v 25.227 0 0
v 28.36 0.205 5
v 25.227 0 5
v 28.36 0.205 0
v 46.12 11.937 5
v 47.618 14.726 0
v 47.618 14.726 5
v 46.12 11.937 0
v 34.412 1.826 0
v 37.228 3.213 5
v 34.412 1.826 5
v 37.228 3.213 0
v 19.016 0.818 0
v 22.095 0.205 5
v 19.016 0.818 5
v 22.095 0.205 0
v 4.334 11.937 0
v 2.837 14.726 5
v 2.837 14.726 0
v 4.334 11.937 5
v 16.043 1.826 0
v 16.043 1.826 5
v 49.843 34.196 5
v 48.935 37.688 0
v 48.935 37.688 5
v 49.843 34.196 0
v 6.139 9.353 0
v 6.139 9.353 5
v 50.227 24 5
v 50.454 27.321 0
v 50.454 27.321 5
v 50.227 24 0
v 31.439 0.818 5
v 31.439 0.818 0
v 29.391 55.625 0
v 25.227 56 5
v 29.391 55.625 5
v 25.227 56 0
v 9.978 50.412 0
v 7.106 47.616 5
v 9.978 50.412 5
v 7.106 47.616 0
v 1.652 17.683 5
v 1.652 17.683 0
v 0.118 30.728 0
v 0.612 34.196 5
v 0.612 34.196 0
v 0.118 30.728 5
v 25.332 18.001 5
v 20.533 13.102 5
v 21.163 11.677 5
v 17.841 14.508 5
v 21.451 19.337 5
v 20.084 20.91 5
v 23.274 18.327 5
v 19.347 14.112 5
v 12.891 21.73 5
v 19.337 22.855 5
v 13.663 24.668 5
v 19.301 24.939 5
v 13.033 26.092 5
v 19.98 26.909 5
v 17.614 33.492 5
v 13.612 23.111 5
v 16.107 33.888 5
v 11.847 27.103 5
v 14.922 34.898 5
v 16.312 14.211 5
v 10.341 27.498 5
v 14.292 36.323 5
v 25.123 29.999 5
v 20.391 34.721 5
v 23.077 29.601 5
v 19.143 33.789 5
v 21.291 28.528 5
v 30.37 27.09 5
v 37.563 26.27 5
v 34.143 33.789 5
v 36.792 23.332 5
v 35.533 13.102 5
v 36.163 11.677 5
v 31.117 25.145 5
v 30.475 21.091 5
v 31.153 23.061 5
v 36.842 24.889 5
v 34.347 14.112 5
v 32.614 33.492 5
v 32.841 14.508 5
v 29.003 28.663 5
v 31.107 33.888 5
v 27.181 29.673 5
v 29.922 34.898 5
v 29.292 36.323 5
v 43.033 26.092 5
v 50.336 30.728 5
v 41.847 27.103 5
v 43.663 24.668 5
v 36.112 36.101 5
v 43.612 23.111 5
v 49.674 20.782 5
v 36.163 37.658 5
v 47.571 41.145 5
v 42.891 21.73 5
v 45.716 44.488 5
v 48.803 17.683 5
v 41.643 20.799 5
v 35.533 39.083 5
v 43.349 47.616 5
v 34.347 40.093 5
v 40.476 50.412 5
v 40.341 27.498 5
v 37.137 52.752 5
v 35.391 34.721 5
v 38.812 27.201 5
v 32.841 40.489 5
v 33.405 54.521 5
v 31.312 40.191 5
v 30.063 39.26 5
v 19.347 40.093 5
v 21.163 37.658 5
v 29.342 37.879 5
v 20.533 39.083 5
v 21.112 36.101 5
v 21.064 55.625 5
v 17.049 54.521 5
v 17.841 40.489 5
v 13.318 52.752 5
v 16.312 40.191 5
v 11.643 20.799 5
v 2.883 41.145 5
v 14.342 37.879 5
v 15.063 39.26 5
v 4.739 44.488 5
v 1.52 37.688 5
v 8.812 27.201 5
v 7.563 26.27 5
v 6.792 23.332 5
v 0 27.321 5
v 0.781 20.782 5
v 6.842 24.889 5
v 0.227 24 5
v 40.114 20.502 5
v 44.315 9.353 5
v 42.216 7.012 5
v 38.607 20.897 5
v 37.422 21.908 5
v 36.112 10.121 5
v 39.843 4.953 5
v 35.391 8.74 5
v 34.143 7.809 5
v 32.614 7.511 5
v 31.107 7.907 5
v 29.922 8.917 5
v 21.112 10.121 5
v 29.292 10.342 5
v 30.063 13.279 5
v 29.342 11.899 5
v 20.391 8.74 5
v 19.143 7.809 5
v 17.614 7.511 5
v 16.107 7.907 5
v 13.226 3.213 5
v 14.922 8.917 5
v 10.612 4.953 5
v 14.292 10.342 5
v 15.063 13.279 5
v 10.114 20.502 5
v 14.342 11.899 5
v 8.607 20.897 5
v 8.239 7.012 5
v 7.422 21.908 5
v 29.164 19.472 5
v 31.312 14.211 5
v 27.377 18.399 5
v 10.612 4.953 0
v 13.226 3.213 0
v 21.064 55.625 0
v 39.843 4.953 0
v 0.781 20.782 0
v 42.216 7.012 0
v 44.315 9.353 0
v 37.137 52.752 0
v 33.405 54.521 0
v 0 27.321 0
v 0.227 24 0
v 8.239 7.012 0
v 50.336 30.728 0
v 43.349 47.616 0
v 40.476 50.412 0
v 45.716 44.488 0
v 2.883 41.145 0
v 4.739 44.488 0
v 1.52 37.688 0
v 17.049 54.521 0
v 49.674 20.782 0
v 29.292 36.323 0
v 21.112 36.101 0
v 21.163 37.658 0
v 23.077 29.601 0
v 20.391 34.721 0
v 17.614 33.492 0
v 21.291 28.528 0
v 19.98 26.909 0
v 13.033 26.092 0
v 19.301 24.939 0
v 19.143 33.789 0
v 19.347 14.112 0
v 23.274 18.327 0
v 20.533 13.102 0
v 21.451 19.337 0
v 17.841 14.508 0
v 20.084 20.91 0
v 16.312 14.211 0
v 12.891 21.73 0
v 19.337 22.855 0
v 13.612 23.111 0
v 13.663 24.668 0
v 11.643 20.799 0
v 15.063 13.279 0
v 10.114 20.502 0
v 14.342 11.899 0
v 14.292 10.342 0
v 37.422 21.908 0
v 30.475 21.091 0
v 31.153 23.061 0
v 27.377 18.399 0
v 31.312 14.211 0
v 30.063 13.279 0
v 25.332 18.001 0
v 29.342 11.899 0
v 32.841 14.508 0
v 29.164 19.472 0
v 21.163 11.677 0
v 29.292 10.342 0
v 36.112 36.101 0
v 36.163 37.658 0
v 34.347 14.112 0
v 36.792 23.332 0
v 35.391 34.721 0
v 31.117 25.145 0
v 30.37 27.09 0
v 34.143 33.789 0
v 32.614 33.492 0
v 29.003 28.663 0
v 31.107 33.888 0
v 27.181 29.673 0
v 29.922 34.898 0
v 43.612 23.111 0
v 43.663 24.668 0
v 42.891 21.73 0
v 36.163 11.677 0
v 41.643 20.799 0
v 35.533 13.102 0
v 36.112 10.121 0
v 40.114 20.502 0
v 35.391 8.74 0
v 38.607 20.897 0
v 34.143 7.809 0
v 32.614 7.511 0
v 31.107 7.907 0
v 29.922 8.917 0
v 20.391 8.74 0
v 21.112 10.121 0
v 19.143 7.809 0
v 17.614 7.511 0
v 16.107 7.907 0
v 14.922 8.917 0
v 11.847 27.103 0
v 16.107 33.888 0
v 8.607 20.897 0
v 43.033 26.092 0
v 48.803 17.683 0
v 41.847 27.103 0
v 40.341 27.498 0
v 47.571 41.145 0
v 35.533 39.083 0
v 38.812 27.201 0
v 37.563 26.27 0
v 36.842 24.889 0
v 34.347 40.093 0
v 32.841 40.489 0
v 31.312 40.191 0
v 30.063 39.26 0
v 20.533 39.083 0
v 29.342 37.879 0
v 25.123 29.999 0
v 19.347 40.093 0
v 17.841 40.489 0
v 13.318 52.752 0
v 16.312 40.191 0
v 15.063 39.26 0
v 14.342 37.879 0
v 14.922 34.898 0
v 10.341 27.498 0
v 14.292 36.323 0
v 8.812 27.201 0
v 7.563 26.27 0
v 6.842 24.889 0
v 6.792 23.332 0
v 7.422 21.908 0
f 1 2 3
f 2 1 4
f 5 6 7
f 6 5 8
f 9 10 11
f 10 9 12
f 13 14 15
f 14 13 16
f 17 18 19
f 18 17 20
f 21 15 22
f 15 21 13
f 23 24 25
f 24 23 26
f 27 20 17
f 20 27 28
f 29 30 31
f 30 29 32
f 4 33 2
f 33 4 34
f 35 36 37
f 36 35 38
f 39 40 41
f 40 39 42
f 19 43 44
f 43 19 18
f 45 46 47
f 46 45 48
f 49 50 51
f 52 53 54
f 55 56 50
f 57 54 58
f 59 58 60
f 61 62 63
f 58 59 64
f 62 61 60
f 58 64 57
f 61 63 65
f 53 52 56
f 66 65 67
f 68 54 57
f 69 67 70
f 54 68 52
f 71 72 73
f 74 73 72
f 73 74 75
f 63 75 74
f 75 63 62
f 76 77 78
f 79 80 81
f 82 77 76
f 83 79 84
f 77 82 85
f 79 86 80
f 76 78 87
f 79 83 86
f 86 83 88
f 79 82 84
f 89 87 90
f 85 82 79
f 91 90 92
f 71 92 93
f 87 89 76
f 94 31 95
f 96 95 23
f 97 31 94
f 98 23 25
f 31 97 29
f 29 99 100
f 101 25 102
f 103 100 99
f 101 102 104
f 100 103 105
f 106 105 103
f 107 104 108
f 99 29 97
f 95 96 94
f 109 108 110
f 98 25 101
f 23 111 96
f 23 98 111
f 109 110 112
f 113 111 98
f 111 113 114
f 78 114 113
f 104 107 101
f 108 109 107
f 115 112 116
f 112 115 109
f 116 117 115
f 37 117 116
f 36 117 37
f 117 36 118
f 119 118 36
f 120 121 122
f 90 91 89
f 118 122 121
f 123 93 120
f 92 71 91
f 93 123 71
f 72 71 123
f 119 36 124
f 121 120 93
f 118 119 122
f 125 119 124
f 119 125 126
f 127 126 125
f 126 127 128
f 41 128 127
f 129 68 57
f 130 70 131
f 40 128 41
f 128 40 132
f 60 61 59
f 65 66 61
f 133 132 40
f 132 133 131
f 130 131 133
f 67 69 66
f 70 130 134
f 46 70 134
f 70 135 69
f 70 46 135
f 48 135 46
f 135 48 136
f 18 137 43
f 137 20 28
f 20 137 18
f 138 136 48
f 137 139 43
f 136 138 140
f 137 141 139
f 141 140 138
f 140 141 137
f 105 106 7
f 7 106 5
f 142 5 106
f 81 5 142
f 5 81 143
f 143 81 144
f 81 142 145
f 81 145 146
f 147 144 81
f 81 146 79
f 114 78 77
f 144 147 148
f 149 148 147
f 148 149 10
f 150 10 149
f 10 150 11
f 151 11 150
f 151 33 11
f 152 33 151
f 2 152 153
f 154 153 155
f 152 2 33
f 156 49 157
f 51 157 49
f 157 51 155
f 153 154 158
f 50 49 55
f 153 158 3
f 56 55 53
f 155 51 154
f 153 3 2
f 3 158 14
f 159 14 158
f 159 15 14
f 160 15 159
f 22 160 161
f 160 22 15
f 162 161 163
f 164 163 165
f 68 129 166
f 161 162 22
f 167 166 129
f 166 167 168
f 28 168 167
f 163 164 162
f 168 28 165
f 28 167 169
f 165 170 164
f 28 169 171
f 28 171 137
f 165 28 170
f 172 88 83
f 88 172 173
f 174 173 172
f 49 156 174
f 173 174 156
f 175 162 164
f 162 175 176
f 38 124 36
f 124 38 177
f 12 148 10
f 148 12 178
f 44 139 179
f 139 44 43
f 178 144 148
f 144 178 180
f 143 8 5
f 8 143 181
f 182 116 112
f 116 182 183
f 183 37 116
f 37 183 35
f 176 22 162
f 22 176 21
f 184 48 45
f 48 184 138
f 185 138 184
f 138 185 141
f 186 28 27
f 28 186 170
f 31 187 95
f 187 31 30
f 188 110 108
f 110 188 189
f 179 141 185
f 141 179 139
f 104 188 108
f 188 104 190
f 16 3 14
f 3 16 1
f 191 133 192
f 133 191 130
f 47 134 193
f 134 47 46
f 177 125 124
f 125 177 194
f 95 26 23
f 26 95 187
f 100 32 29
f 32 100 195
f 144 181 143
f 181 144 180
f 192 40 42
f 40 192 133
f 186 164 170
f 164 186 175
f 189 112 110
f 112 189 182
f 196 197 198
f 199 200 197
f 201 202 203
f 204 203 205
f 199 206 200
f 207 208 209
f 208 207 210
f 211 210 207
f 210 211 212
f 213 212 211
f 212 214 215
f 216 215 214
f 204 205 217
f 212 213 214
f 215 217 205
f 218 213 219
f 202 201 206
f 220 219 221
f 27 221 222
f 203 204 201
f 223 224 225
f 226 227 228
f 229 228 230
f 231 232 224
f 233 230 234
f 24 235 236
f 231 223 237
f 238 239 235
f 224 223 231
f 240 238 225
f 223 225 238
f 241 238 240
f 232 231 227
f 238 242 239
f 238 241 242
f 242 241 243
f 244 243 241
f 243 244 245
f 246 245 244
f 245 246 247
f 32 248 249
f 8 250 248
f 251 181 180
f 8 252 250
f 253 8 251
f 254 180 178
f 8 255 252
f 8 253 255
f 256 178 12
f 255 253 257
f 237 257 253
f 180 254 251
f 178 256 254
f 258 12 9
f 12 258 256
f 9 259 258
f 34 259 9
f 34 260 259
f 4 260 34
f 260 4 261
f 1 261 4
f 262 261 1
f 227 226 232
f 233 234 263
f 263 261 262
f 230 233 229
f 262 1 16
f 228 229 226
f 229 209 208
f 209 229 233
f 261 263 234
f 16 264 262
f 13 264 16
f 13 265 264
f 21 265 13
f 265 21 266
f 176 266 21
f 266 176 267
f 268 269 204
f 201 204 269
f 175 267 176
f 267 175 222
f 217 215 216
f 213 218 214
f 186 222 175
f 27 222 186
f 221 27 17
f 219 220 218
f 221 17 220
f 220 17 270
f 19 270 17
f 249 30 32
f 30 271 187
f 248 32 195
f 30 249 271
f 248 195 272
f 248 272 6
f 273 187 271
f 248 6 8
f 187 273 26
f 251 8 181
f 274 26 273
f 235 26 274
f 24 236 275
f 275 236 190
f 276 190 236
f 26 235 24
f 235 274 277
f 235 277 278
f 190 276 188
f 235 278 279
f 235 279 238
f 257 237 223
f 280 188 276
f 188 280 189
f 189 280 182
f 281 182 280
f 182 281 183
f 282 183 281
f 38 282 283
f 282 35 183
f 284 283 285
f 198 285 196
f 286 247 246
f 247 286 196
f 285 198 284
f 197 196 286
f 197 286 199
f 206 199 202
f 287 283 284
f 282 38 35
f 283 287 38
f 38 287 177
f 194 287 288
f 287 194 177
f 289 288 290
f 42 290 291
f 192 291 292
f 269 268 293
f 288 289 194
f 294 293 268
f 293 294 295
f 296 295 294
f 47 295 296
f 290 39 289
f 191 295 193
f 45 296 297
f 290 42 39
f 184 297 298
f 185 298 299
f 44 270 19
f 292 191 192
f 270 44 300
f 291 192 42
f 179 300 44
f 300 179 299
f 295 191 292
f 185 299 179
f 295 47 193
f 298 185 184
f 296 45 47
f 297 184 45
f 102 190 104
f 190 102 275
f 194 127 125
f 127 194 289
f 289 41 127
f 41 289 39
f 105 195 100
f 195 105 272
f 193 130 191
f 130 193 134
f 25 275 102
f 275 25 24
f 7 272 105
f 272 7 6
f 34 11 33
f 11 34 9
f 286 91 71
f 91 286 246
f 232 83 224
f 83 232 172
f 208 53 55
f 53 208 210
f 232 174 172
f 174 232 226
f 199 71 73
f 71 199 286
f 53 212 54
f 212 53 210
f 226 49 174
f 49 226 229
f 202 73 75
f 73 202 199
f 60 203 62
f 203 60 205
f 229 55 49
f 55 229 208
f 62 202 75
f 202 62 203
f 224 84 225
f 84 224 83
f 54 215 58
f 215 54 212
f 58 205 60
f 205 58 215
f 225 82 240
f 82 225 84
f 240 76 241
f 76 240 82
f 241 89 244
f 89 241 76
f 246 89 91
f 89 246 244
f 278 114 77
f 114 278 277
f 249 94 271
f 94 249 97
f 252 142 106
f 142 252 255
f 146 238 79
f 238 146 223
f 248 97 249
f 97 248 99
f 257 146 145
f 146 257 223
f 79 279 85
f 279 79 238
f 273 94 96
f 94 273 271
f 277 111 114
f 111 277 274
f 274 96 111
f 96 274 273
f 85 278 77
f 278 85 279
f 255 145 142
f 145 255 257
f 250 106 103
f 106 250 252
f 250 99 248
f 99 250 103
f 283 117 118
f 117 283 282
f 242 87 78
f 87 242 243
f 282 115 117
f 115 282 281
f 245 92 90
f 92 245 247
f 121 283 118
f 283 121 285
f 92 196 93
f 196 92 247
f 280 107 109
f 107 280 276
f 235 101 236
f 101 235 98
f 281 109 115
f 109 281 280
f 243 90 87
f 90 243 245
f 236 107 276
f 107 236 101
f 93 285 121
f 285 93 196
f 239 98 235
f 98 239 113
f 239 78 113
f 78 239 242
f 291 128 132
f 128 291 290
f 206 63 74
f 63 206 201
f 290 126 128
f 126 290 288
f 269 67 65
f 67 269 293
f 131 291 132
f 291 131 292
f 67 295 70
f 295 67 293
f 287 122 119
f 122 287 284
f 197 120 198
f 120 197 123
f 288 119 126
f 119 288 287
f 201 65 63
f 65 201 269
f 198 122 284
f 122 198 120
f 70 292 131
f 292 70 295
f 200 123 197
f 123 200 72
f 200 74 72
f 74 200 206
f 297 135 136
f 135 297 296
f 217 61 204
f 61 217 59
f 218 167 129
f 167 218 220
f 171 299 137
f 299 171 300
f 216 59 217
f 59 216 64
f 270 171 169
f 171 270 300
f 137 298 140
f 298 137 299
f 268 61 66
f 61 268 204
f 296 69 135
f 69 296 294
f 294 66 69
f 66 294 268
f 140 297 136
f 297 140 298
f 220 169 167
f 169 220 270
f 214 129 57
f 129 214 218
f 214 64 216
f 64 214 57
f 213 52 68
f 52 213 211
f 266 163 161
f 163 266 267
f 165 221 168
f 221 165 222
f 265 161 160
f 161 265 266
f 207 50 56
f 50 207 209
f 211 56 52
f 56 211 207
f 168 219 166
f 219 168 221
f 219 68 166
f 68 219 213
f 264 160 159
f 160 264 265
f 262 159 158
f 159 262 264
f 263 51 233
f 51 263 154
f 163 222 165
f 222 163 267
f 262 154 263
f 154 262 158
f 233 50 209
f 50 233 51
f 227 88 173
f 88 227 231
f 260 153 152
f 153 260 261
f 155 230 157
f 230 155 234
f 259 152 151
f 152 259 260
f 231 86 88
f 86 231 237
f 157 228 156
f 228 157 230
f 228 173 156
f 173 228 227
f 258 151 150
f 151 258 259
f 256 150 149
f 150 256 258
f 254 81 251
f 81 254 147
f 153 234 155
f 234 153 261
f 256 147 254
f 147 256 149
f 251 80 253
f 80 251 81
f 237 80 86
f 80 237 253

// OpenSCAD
$fn = 32;

// ----------------------------------------------------------------------
// Cam plate: single_lobe cam, base R24
// ----------------------------------------------------------------------

// --- parameters (mm) ---
base_r = 24;              // base circle radius
lobe_h = 8;               // cam lobe rise
bore_r = 6;               // shaft bore radius
plate_t = 5;              // plate thickness, Z (extrusion height)
ring_r = 15;              // lightening ring radius
bolt_r = 3.5;             // lightening hole radius

profile = [[50.227, 24], [50.454, 27.321], [50.336, 30.728], [49.843, 34.196], [48.935, 37.688], [47.571, 41.145], [45.716, 44.488], [43.349, 47.616], [40.476, 50.412], [37.137, 52.752], [33.405, 54.521], [29.391, 55.625], [25.227, 56], [21.064, 55.625], [17.049, 54.521], [13.318, 52.752], [9.978, 50.412], [7.106, 47.616], [4.739, 44.488], [2.883, 41.145], [1.52, 37.688], [0.612, 34.196], [0.118, 30.728], [0, 27.321], [0.227, 24], [0.781, 20.782], [1.652, 17.683], [2.837, 14.726], [4.334, 11.937], [6.139, 9.353], [8.239, 7.012], [10.612, 4.953], [13.226, 3.213], [16.043, 1.826], [19.016, 0.818], [22.095, 0.205], [25.227, 0], [28.36, 0.205], [31.439, 0.818], [34.412, 1.826], [37.228, 3.213], [39.843, 4.953], [42.216, 7.012], [44.315, 9.353], [46.12, 11.937], [47.618, 14.726], [48.803, 17.683], [49.674, 20.782]];  // primary outline, 48 points, counter clockwise
void_1 = [[31.117, 25.145], [30.37, 27.09], [29.003, 28.663], [27.181, 29.673], [25.123, 29.999], [23.077, 29.601], [21.291, 28.528], [19.98, 26.909], [19.301, 24.939], [19.337, 22.855], [20.084, 20.91], [21.451, 19.337], [23.274, 18.327], [25.332, 18.001], [27.377, 18.399], [29.164, 19.472], [30.475, 21.091], [31.153, 23.061]];  // shaft bore, 18 points
void_2 = [[43.663, 24.668], [43.033, 26.092], [41.847, 27.103], [40.341, 27.498], [38.812, 27.201], [37.563, 26.27], [36.842, 24.889], [36.792, 23.332], [37.422, 21.908], [38.607, 20.897], [40.114, 20.502], [41.643, 20.799], [42.891, 21.73], [43.612, 23.111]];  // lightening hole 1, 14 points
void_3 = [[36.163, 37.658], [35.533, 39.083], [34.347, 40.093], [32.841, 40.489], [31.312, 40.191], [30.063, 39.26], [29.342, 37.879], [29.292, 36.323], [29.922, 34.898], [31.107, 33.888], [32.614, 33.492], [34.143, 33.789], [35.391, 34.721], [36.112, 36.101]];  // lightening hole 2, 14 points
void_4 = [[21.163, 37.658], [20.533, 39.083], [19.347, 40.093], [17.841, 40.489], [16.312, 40.191], [15.063, 39.26], [14.342, 37.879], [14.292, 36.323], [14.922, 34.898], [16.107, 33.888], [17.614, 33.492], [19.143, 33.789], [20.391, 34.721], [21.112, 36.101]];  // lightening hole 3, 14 points
void_5 = [[13.663, 24.668], [13.033, 26.092], [11.847, 27.103], [10.341, 27.498], [8.812, 27.201], [7.563, 26.27], [6.842, 24.889], [6.792, 23.332], [7.422, 21.908], [8.607, 20.897], [10.114, 20.502], [11.643, 20.799], [12.891, 21.73], [13.612, 23.111]];  // lightening hole 4, 14 points
void_6 = [[21.163, 11.677], [20.533, 13.102], [19.347, 14.112], [17.841, 14.508], [16.312, 14.211], [15.063, 13.279], [14.342, 11.899], [14.292, 10.342], [14.922, 8.917], [16.107, 7.907], [17.614, 7.511], [19.143, 7.809], [20.391, 8.74], [21.112, 10.121]];  // lightening hole 5, 14 points
void_7 = [[36.163, 11.677], [35.533, 13.102], [34.347, 14.112], [32.841, 14.508], [31.312, 14.211], [30.063, 13.279], [29.342, 11.899], [29.292, 10.342], [29.922, 8.917], [31.107, 7.907], [32.614, 7.511], [34.143, 7.809], [35.391, 8.74], [36.112, 10.121]];  // lightening hole 6, 14 points

// --- the one profile operation ---
difference() {
  linear_extrude(height = plate_t) polygon(points = profile);
  translate([0, 0, -1])
    linear_extrude(height = plate_t + 2) polygon(points = void_1);
  translate([0, 0, -1])
    linear_extrude(height = plate_t + 2) polygon(points = void_2);
  translate([0, 0, -1])
    linear_extrude(height = plate_t + 2) polygon(points = void_3);
  translate([0, 0, -1])
    linear_extrude(height = plate_t + 2) polygon(points = void_4);
  translate([0, 0, -1])
    linear_extrude(height = plate_t + 2) polygon(points = void_5);
  translate([0, 0, -1])
    linear_extrude(height = plate_t + 2) polygon(points = void_6);
  translate([0, 0, -1])
    linear_extrude(height = plate_t + 2) polygon(points = void_7);
}
